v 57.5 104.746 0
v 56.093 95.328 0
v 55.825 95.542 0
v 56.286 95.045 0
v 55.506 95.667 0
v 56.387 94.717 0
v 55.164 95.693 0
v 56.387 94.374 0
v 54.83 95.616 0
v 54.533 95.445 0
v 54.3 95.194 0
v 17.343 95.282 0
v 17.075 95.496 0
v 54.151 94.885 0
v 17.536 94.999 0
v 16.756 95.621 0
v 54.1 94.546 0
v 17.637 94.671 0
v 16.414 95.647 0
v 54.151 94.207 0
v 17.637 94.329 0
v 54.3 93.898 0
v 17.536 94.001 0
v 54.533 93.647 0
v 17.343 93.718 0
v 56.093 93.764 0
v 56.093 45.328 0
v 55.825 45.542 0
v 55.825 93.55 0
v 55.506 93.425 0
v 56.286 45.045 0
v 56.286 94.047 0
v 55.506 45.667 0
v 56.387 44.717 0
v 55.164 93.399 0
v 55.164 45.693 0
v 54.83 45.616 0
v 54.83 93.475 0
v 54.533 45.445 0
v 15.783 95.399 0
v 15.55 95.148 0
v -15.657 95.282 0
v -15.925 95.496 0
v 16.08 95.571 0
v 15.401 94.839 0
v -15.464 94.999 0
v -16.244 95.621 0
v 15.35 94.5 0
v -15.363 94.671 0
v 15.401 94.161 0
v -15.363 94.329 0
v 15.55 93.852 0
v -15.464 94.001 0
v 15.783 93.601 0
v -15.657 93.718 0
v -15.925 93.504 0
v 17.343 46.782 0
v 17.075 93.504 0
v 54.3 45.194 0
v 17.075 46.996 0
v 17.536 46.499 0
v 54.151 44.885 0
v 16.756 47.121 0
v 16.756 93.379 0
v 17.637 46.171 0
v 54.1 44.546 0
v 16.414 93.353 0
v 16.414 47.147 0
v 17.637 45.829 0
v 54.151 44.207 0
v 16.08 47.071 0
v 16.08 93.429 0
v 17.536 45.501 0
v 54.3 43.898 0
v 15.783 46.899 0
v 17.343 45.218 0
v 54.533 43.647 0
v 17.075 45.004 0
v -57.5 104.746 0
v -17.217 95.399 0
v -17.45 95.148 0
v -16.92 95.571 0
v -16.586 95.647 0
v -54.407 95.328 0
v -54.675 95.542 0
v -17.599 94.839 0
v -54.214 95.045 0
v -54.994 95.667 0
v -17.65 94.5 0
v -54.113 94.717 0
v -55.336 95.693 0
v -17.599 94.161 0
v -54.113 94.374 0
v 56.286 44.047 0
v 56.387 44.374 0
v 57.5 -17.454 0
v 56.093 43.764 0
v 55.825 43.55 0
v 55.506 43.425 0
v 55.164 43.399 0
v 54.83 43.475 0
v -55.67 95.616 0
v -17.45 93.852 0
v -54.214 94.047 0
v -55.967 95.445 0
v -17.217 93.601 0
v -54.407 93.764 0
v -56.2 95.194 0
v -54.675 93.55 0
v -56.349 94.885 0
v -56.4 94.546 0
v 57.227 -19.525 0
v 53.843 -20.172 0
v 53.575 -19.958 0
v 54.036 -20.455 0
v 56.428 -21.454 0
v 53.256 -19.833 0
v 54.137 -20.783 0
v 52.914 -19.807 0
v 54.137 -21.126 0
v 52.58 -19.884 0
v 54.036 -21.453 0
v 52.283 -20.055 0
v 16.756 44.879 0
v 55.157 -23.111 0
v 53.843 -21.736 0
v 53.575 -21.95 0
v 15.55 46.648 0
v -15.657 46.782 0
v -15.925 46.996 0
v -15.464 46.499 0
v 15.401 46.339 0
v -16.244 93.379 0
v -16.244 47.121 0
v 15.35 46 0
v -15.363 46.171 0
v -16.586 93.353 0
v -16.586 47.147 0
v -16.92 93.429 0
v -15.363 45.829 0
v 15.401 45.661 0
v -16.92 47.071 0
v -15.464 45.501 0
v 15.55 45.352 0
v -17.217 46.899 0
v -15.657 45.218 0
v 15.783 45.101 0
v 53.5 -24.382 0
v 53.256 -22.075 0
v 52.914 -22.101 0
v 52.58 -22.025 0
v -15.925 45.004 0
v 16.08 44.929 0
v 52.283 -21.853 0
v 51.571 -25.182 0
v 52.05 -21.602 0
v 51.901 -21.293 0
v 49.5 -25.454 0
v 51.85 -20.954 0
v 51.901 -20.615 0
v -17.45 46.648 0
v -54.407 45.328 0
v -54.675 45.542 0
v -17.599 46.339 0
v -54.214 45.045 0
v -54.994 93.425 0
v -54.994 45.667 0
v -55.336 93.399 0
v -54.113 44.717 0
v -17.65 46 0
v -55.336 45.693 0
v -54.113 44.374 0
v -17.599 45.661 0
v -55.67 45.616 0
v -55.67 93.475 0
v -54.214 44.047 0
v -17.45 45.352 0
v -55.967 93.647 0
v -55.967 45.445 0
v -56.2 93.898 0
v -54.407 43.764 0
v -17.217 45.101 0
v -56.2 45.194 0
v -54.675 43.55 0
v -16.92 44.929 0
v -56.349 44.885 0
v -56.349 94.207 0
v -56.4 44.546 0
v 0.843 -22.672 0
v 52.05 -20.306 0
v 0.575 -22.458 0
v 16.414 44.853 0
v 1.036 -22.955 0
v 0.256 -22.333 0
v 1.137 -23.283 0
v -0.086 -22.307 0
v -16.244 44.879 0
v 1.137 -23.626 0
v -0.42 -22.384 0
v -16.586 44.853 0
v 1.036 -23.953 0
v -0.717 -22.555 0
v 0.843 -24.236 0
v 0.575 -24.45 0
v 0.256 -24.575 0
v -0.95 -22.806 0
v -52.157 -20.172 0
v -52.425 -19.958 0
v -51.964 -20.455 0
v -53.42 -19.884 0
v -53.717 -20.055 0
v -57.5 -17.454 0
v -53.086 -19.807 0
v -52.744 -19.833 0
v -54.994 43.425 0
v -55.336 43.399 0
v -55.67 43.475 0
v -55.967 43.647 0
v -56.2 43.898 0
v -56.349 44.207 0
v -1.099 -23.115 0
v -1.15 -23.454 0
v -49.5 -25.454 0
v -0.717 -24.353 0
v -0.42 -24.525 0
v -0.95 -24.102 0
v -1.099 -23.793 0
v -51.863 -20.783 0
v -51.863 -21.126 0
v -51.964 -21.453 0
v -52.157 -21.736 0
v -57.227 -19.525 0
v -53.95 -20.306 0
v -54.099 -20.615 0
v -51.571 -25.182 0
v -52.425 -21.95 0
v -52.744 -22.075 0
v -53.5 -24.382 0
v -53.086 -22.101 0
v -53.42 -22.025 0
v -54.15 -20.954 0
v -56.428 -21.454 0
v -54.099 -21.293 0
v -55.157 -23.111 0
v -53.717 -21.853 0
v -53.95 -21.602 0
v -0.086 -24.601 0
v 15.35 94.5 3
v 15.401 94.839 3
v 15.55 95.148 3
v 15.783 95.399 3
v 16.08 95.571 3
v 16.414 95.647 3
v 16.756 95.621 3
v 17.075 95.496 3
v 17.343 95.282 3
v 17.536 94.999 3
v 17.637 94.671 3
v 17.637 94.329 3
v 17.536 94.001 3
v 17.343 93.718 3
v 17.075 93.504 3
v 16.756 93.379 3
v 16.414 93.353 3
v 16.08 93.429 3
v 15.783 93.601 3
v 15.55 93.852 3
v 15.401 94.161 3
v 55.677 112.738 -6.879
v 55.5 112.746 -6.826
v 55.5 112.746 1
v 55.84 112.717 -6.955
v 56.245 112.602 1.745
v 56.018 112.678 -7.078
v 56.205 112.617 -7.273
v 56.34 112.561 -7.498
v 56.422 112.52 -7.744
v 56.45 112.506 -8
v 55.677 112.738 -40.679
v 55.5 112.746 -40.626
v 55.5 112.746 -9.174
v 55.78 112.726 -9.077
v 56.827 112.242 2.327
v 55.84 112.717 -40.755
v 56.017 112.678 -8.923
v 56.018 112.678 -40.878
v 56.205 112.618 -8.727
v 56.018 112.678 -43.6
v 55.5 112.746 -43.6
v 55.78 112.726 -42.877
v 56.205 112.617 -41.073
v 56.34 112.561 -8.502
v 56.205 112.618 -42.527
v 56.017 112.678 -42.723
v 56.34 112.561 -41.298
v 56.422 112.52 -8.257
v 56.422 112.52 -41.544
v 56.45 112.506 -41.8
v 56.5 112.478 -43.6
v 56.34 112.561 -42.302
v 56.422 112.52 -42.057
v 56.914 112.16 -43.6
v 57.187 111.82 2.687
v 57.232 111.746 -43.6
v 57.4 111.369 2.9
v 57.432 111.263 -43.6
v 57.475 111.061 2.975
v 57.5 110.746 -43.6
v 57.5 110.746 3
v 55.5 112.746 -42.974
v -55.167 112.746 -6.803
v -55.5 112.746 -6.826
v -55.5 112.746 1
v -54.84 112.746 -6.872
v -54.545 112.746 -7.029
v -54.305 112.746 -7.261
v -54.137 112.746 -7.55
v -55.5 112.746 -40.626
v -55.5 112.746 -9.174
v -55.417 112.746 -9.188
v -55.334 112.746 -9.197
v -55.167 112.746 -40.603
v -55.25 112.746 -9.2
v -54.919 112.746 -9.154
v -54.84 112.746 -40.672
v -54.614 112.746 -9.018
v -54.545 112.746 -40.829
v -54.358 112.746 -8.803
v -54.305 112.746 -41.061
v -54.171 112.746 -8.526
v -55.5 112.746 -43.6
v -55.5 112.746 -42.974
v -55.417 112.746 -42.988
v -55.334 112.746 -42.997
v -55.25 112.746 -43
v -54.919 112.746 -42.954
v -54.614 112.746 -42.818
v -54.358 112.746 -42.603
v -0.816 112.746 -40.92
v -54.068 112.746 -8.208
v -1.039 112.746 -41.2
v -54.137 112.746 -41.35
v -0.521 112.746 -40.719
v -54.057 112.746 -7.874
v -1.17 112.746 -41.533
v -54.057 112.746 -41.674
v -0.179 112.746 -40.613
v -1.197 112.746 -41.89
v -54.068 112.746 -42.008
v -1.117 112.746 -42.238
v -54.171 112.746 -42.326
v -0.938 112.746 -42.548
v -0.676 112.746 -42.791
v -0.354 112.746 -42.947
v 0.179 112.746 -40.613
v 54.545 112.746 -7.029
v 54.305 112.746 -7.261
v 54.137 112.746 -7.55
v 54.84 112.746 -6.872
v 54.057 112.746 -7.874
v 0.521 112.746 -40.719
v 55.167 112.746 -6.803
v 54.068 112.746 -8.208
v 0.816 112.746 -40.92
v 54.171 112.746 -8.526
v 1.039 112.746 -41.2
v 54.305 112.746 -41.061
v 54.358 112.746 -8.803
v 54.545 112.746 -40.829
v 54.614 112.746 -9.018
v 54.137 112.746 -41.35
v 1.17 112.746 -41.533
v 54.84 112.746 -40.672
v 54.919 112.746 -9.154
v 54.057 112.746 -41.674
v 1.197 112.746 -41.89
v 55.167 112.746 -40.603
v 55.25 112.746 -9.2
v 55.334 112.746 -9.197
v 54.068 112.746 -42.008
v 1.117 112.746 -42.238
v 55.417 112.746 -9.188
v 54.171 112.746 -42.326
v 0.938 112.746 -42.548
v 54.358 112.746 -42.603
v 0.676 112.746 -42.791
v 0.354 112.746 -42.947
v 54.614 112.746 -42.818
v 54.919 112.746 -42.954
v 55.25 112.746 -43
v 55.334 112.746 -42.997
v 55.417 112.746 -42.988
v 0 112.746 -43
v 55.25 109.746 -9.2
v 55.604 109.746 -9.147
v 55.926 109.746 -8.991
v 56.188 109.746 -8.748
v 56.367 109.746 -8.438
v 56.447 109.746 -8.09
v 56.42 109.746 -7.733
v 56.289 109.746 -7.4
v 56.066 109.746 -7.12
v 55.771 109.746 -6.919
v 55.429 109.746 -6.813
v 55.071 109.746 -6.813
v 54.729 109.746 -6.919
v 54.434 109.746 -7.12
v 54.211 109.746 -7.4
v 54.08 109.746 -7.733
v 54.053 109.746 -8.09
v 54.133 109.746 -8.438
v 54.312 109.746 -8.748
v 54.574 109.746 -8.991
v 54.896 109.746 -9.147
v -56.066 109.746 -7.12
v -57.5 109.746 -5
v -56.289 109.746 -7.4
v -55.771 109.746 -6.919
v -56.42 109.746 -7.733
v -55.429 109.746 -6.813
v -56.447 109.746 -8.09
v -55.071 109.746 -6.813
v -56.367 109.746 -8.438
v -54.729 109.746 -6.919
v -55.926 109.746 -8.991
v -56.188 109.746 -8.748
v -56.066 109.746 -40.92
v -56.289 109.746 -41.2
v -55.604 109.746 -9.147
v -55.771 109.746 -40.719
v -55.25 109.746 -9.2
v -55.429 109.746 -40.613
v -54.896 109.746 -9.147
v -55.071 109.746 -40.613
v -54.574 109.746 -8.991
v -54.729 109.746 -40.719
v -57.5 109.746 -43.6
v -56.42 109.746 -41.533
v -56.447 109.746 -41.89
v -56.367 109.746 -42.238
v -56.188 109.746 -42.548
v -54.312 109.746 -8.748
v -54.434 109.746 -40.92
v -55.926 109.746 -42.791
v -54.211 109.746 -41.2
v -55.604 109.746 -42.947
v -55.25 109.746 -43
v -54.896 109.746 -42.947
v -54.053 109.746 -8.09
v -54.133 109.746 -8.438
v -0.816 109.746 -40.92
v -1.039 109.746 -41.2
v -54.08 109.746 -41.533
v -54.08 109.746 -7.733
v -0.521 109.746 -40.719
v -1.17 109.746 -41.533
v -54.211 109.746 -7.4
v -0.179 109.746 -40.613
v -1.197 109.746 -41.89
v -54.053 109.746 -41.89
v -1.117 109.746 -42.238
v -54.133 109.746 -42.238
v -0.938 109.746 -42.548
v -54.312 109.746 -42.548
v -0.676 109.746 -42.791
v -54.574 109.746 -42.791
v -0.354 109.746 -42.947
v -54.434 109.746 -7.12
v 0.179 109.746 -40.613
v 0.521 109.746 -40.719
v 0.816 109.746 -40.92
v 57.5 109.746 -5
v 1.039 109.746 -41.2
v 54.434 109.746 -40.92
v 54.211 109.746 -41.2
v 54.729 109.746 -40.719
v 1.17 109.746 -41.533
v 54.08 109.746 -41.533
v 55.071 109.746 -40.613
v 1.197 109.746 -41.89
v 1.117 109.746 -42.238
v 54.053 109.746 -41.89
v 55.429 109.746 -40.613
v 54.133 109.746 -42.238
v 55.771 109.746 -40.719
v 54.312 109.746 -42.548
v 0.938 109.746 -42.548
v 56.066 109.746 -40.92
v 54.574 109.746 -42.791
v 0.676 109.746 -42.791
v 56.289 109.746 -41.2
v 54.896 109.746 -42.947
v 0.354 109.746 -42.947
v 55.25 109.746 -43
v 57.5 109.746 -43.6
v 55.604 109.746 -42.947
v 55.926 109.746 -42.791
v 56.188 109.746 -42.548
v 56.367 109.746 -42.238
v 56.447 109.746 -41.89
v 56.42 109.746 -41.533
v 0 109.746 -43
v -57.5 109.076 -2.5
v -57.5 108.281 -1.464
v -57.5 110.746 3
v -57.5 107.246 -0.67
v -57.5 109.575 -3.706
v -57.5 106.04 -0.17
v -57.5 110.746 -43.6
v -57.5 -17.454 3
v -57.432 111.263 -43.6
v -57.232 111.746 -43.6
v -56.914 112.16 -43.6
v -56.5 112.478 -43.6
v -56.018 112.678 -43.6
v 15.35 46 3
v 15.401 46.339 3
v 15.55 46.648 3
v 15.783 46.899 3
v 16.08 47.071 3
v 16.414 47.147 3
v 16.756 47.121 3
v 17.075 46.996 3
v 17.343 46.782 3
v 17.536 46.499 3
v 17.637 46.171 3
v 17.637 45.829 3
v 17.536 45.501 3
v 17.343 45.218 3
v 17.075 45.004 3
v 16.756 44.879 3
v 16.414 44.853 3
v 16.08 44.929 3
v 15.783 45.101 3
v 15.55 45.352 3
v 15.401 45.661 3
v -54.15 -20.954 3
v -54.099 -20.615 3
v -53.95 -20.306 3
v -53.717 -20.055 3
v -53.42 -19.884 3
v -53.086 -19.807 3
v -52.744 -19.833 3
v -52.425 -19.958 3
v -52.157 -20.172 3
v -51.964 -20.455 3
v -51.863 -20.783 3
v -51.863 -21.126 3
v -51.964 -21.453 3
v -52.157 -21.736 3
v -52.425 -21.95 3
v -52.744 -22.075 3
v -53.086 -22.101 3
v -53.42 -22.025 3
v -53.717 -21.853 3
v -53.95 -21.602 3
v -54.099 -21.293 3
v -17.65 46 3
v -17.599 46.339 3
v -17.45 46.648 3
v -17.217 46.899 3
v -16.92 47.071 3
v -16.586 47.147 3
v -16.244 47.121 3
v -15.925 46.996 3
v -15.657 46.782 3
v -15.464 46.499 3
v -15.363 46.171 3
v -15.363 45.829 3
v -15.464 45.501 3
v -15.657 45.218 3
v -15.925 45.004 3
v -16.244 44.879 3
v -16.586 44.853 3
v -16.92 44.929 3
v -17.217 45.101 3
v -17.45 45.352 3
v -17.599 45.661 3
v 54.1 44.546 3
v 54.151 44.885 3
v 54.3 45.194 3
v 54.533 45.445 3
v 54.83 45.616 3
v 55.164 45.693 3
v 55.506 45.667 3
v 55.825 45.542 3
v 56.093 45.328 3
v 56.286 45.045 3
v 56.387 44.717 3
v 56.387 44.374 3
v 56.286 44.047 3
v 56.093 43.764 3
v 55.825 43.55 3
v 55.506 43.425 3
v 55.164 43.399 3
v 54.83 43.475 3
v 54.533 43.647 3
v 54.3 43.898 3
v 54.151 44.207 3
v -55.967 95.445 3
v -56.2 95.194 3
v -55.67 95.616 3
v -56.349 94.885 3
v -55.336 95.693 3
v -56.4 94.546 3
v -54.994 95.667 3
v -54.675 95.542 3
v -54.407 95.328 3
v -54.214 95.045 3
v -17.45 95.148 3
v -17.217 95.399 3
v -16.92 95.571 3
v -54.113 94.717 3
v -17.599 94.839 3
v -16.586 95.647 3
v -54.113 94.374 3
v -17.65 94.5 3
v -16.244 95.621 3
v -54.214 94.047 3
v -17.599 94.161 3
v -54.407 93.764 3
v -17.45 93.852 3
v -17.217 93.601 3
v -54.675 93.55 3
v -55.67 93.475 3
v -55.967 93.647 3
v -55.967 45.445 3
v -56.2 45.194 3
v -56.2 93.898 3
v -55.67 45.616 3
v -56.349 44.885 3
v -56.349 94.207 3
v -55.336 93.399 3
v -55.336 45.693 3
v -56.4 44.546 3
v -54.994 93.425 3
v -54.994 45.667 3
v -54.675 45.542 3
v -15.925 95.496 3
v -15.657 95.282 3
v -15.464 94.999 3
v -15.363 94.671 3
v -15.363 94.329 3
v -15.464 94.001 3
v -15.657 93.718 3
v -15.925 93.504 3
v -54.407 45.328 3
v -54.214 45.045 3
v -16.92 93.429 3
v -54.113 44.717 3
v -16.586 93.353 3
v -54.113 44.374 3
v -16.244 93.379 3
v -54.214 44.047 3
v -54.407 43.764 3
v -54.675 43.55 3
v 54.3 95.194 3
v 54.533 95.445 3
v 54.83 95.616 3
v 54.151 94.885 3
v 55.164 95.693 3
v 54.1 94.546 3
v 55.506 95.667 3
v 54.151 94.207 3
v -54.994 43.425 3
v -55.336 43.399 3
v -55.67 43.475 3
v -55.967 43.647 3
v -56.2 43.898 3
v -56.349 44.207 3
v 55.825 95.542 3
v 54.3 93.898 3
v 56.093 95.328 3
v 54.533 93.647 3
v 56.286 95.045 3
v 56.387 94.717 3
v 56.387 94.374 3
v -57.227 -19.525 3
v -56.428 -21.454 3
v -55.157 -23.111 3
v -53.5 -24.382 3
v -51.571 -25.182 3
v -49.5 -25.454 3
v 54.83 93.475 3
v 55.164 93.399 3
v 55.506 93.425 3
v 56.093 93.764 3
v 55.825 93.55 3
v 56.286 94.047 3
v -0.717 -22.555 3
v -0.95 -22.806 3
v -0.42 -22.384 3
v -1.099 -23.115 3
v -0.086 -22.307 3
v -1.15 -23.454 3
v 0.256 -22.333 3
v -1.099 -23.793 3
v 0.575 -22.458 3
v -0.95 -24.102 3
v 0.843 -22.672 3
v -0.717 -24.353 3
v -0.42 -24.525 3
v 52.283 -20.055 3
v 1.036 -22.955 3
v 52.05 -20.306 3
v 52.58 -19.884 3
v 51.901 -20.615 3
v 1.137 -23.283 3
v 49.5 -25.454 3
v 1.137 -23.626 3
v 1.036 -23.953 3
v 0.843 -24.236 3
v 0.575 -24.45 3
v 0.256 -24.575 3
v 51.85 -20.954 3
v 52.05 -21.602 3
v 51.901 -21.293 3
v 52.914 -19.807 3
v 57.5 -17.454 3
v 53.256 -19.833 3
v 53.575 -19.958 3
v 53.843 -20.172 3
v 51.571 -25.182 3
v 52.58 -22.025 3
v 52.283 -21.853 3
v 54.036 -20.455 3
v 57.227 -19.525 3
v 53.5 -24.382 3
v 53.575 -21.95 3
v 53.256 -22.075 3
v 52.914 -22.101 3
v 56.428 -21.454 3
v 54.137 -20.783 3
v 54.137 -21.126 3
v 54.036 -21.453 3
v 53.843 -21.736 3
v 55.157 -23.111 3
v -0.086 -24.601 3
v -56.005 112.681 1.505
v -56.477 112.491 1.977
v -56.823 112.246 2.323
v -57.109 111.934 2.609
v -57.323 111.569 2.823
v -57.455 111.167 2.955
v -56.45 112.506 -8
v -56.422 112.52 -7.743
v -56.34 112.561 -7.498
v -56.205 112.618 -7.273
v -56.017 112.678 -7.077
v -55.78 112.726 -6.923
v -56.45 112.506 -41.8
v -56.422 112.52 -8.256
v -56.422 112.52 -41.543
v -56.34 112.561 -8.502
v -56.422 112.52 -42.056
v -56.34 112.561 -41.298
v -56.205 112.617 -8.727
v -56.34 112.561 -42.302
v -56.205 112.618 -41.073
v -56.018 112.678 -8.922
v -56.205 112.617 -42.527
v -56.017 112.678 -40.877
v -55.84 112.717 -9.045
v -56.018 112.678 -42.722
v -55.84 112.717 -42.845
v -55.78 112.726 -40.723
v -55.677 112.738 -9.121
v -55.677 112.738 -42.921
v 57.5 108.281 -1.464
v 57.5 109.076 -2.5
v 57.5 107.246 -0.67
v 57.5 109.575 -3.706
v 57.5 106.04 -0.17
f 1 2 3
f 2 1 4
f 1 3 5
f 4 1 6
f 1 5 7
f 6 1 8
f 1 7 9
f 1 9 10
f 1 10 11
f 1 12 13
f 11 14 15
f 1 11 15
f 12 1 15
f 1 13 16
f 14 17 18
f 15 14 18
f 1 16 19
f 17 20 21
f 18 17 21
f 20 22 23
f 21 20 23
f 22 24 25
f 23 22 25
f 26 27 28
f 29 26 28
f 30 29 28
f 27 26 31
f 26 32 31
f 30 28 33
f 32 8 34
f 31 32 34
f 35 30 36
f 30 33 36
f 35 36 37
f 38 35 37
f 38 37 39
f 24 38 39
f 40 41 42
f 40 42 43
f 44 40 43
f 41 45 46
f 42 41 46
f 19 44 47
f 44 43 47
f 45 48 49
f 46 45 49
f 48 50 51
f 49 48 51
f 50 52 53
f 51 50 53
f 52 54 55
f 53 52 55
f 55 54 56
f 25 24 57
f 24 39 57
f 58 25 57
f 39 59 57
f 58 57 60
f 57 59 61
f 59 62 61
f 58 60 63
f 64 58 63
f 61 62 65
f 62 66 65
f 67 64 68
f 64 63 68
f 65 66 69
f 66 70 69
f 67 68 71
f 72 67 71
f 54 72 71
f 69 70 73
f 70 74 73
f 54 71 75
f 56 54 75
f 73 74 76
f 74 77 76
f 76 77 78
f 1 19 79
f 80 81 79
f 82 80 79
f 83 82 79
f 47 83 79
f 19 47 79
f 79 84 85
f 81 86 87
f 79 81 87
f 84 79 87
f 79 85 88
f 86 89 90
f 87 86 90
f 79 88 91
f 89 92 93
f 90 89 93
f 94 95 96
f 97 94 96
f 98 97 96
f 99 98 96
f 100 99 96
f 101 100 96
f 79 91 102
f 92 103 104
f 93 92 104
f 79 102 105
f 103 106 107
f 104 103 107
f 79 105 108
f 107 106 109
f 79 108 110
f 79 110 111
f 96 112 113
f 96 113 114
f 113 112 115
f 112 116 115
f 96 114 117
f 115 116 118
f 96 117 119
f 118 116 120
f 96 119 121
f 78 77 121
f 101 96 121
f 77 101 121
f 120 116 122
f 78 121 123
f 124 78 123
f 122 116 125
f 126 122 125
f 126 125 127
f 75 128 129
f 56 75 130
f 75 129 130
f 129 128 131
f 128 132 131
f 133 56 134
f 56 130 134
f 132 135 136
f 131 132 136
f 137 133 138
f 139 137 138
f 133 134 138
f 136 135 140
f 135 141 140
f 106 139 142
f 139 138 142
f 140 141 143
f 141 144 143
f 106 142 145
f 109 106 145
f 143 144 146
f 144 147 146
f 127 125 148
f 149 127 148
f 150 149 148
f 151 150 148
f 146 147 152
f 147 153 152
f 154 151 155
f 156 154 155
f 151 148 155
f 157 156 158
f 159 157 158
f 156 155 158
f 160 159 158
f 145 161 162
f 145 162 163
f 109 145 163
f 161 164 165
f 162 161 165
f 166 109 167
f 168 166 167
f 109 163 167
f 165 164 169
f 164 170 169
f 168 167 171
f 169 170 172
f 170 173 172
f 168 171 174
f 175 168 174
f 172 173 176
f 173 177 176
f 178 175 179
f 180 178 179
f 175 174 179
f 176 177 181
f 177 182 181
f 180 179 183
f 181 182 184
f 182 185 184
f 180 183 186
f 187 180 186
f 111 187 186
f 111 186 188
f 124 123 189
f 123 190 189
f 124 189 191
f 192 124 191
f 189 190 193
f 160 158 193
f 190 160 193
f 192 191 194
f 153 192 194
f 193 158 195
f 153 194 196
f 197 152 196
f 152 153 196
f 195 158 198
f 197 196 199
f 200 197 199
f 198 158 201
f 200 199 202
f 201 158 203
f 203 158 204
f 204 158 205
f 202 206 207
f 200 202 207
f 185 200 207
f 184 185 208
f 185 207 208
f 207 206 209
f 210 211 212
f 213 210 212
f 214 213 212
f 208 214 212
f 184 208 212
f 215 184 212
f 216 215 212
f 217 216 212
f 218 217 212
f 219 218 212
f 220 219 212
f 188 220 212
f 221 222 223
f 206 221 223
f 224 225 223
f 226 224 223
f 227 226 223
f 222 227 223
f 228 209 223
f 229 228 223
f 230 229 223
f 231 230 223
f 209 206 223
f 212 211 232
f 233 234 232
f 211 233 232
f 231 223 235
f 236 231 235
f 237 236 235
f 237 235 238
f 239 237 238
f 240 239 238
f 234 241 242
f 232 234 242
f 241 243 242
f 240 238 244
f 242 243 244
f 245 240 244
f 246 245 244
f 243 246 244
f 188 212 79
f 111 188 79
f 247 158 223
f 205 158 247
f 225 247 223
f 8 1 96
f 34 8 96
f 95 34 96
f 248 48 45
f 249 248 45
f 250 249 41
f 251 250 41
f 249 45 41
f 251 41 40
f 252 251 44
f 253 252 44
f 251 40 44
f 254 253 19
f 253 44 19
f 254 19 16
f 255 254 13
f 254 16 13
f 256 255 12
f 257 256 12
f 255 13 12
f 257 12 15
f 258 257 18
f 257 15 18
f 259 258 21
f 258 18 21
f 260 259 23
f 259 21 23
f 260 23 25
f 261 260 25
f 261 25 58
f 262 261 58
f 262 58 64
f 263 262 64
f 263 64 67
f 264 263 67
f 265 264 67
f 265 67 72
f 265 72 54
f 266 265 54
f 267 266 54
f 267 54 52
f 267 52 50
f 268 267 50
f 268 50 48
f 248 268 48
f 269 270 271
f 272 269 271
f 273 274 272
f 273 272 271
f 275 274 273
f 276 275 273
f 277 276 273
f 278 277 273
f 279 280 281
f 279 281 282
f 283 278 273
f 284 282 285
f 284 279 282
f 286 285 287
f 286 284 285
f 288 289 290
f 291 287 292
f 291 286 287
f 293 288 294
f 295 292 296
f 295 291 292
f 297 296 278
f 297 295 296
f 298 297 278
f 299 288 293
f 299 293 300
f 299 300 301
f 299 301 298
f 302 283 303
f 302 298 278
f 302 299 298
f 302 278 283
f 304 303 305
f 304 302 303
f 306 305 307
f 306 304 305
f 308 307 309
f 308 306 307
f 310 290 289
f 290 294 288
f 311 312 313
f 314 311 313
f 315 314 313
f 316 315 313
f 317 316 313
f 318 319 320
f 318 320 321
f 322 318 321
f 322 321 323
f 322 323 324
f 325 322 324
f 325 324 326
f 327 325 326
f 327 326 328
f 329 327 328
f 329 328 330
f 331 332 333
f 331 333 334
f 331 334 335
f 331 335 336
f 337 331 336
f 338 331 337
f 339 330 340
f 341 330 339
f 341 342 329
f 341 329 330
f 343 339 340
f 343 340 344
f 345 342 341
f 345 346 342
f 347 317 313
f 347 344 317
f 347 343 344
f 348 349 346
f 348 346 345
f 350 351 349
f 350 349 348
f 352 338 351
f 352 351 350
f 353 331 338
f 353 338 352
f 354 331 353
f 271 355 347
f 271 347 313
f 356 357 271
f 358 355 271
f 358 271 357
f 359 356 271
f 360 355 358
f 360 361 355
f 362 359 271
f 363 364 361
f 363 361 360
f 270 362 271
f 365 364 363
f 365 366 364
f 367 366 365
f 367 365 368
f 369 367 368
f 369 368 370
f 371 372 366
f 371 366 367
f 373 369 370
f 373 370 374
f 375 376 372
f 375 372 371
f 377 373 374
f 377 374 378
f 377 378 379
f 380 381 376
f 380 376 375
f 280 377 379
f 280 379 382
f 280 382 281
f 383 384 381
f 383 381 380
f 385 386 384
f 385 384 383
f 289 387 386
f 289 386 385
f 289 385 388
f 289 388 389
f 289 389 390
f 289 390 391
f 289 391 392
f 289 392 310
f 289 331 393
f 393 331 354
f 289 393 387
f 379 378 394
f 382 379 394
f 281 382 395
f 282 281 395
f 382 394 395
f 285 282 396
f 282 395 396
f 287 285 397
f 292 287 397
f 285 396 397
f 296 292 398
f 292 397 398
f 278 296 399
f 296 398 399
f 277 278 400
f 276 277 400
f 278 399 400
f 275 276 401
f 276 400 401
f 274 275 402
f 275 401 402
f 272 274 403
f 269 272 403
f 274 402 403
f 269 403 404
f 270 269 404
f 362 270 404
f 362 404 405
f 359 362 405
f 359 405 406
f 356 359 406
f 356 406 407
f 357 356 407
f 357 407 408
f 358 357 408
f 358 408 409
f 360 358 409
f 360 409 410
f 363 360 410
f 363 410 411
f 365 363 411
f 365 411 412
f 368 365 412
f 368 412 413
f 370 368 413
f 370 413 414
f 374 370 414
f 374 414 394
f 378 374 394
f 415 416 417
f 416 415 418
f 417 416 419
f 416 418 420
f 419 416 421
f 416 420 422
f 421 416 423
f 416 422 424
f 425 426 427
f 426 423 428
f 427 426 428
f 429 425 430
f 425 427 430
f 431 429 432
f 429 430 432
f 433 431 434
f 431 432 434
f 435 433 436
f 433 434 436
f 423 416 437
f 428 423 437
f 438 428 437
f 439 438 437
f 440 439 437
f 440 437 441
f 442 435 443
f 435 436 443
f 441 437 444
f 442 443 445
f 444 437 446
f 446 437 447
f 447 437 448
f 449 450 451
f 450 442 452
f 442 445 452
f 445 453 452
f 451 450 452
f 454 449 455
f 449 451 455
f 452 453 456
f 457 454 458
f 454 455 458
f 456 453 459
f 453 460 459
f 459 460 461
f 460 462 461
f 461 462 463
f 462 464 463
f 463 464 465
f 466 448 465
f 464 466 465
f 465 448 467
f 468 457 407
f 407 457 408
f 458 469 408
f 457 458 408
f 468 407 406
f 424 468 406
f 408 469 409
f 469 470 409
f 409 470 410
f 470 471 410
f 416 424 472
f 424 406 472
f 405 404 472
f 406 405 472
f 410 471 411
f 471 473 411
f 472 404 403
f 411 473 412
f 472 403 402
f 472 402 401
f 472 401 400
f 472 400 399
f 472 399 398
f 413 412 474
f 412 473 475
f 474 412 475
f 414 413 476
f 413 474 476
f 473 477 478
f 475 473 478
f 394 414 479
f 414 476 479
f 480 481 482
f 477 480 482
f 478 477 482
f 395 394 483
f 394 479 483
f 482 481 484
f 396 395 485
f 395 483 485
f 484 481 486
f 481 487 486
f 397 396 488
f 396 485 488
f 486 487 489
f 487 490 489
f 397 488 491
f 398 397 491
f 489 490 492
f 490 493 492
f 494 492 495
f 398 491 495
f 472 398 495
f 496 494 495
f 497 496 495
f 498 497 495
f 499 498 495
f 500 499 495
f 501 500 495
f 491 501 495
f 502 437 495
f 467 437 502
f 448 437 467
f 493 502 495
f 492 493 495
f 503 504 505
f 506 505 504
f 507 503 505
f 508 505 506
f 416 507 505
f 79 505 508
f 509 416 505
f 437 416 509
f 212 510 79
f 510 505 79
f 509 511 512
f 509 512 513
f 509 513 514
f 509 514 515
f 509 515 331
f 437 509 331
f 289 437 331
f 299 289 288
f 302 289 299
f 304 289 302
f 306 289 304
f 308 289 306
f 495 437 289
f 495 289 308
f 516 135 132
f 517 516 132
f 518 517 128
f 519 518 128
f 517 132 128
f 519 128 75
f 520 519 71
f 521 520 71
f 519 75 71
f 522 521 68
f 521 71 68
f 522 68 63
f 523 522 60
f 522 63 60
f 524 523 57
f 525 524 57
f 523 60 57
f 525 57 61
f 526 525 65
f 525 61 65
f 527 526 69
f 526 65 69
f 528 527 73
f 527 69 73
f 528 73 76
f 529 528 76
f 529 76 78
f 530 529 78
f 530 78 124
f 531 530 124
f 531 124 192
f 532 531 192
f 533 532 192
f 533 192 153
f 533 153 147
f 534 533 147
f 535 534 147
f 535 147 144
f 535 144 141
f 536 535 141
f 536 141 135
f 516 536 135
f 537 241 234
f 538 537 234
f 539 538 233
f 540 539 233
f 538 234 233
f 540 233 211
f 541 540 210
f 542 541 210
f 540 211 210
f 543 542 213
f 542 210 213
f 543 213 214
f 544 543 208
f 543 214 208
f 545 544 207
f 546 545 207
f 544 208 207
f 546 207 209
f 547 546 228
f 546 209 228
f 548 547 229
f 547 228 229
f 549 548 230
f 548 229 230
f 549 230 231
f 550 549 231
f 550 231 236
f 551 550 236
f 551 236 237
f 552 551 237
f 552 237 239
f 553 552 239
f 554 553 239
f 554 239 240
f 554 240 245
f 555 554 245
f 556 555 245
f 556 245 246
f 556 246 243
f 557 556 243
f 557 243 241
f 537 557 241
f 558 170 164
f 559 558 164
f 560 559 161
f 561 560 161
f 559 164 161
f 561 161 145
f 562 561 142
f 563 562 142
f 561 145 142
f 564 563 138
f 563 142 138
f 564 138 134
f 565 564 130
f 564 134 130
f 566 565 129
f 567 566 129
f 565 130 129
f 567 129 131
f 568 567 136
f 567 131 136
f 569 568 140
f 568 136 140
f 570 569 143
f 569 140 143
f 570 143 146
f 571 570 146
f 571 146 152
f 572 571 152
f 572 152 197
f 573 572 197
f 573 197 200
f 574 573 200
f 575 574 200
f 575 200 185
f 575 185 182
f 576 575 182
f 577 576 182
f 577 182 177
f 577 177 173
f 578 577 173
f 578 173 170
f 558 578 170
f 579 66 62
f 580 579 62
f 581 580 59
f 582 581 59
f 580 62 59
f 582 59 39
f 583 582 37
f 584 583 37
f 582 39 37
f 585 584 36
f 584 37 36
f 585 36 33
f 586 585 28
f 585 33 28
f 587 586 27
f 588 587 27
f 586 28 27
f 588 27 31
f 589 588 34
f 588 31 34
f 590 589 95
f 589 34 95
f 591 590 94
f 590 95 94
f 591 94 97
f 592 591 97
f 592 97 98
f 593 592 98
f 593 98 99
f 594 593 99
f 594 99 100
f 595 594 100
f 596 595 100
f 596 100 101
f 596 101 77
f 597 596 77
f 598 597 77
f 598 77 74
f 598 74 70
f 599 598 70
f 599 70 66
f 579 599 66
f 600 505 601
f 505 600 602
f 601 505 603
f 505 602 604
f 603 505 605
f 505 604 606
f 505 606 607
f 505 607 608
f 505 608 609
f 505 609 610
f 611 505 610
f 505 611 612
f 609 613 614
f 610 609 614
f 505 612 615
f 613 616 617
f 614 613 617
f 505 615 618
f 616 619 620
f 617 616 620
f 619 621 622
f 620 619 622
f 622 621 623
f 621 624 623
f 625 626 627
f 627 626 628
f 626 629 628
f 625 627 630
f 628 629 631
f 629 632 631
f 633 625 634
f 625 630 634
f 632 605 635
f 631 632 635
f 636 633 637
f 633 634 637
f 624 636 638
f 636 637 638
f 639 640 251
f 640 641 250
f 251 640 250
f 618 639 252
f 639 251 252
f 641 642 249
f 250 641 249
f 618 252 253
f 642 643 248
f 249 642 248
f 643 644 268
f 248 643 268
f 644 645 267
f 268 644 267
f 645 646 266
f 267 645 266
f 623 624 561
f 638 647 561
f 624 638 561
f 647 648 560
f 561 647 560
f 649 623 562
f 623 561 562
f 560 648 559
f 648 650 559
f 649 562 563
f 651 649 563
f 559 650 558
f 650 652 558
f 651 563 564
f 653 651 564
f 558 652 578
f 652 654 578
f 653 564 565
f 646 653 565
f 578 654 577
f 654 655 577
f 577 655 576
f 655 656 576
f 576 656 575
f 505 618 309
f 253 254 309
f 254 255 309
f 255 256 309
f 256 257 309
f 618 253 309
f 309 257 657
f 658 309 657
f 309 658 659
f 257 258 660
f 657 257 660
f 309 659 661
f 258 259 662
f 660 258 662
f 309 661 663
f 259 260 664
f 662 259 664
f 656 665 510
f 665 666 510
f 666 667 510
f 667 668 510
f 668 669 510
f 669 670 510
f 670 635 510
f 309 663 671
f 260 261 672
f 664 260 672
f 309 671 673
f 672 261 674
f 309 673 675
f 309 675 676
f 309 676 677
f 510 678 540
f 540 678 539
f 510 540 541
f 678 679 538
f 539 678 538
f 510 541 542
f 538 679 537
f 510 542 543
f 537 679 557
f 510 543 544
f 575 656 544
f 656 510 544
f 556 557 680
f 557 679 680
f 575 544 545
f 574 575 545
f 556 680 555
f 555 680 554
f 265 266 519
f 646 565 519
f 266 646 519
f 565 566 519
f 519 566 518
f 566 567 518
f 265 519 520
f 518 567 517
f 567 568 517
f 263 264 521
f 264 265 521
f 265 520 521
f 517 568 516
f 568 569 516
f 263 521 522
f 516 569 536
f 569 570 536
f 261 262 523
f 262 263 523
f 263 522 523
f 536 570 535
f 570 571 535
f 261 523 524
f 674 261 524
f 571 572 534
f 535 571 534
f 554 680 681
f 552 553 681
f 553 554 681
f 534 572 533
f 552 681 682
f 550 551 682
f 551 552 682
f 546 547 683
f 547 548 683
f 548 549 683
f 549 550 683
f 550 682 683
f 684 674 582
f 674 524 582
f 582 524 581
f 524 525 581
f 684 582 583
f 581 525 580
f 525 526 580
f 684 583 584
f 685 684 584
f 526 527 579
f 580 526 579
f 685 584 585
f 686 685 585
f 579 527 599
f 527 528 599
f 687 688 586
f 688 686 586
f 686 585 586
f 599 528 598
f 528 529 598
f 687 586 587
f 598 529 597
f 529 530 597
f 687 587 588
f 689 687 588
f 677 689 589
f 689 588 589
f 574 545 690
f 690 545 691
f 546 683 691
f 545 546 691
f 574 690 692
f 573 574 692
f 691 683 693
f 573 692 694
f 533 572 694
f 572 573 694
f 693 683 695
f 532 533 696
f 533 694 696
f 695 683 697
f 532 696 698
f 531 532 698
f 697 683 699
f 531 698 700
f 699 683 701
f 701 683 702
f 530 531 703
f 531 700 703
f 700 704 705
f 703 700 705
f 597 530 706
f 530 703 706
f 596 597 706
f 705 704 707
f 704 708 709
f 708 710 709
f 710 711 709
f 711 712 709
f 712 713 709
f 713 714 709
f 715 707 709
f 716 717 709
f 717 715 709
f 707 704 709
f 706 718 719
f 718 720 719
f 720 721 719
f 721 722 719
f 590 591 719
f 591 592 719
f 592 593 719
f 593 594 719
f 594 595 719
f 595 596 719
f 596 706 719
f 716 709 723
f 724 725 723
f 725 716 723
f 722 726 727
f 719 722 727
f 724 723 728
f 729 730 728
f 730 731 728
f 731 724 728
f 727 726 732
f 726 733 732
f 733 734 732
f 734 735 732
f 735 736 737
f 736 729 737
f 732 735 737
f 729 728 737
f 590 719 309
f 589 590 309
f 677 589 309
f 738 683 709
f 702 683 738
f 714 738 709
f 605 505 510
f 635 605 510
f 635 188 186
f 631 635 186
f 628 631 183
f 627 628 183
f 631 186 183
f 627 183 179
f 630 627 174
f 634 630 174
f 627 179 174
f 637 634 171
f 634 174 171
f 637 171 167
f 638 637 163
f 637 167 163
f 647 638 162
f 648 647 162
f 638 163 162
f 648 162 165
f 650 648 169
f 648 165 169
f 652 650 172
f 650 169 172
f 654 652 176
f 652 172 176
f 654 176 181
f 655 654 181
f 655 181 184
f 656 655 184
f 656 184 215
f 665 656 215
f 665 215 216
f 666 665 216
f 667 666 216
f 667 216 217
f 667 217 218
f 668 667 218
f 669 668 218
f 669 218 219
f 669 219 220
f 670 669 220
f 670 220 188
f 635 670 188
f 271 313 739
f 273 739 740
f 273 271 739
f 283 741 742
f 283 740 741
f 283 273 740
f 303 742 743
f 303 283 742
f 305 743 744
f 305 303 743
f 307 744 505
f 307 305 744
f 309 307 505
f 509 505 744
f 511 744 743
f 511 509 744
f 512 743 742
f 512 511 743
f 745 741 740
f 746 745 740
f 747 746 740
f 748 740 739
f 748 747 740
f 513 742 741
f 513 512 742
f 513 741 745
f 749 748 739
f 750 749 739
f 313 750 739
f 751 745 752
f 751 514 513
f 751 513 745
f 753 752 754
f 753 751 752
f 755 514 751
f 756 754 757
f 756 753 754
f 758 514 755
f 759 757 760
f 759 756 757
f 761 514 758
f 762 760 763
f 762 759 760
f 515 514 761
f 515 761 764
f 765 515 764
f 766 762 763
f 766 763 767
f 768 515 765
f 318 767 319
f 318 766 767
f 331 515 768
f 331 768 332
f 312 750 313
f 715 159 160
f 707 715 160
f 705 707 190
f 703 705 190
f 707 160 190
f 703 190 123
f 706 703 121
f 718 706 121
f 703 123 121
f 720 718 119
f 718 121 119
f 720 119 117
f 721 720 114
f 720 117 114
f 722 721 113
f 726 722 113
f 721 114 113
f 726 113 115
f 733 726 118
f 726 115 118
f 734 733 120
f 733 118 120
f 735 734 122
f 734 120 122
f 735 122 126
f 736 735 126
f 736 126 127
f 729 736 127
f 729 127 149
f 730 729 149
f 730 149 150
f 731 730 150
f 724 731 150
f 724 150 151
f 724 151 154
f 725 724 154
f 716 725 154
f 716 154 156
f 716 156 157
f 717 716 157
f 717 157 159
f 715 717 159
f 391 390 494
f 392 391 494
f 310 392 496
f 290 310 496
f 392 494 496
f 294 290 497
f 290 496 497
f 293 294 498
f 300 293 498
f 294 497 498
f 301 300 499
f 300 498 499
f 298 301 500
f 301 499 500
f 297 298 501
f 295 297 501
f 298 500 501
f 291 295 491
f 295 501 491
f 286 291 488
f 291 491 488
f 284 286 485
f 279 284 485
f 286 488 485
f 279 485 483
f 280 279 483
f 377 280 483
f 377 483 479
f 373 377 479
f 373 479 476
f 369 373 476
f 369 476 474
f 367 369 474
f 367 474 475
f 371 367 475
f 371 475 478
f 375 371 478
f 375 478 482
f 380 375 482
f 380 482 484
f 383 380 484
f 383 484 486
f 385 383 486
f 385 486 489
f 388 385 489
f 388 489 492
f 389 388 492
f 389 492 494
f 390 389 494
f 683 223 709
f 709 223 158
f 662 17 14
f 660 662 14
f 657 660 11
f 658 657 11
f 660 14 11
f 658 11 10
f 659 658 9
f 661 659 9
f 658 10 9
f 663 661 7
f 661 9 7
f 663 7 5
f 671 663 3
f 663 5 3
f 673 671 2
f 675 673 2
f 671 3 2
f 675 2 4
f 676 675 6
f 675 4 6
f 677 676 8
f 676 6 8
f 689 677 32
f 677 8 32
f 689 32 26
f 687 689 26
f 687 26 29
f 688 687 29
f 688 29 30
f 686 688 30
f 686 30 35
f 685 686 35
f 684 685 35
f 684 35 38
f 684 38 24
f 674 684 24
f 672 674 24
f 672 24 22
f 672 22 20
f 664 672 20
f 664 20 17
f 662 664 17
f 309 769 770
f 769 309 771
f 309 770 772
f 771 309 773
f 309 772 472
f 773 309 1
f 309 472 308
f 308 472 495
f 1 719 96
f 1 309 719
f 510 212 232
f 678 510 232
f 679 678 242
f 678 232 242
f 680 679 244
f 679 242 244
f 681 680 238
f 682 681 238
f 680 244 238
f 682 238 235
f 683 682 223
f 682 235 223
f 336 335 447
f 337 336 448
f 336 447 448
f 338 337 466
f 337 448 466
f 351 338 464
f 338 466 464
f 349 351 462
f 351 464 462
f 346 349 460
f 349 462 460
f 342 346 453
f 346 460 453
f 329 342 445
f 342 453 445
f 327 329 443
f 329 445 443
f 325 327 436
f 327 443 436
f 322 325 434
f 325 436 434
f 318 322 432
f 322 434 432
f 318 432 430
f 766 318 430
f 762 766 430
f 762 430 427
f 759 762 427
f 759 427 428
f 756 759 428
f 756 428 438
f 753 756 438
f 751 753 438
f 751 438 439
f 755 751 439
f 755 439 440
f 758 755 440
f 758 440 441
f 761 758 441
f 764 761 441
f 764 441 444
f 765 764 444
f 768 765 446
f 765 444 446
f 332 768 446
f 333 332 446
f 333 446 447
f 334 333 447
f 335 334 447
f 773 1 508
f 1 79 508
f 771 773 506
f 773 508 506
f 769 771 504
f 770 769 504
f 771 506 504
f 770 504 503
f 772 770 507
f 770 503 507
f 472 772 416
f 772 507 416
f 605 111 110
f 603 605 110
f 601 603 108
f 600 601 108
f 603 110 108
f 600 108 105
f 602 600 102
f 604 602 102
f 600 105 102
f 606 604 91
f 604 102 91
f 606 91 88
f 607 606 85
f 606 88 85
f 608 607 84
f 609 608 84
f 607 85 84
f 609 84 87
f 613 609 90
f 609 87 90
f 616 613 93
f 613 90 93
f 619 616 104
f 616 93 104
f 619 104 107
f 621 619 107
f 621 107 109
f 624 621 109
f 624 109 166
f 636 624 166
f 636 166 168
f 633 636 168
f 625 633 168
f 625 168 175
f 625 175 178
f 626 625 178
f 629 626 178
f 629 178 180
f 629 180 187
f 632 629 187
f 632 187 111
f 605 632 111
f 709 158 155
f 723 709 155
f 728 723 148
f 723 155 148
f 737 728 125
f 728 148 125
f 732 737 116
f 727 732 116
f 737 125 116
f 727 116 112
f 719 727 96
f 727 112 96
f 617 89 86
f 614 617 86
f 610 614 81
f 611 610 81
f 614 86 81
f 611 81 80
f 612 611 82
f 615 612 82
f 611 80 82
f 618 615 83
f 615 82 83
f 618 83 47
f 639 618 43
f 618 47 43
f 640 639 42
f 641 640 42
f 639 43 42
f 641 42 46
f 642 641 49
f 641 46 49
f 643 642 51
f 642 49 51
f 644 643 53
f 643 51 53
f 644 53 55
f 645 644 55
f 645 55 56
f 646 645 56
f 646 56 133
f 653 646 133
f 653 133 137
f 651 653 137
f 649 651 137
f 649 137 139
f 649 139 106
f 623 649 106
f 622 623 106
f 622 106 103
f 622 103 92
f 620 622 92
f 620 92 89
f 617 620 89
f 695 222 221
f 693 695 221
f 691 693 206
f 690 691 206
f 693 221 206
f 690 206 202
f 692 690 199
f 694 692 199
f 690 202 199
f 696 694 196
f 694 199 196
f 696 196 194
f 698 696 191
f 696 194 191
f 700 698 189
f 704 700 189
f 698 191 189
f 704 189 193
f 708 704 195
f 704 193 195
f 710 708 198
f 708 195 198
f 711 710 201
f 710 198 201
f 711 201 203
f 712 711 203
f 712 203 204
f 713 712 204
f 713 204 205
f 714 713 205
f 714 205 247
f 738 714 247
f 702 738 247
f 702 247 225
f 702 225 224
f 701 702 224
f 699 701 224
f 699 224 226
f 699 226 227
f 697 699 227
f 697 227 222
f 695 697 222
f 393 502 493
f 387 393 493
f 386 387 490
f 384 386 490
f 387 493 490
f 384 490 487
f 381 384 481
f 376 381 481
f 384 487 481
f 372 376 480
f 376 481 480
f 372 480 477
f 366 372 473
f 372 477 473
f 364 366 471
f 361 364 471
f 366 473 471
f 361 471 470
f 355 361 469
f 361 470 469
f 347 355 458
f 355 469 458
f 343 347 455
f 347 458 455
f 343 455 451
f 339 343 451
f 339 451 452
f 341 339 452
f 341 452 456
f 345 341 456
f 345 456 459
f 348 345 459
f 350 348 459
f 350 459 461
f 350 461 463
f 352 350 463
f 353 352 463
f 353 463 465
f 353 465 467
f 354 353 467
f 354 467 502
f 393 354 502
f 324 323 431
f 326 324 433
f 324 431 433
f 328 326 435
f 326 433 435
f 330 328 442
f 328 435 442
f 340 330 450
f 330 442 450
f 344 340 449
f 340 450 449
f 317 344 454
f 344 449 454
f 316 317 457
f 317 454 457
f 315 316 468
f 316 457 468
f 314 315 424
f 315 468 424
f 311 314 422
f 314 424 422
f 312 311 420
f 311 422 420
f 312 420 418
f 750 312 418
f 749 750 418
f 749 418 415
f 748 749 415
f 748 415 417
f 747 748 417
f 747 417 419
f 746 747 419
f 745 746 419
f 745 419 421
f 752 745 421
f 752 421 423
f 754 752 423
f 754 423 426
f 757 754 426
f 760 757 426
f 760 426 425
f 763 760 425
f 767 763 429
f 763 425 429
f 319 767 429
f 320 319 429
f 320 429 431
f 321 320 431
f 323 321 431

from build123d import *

# Parameters (mm, degrees)
BOSS_EXTRUDE3_DEPTH = 3
MOVE_FACE1_BY       = 5.4
SKETCH3_W           = 115
SKETCH3_H           = 46.6
BOSS_EXTRUDE4_DEPTH = 3
FILLET3_R           = 5
FILLET5_R           = 2
SKETCH4_R           = 1.15
CUT_EXTRUDE1_DEPTH  = 134.861204865
SKETCH5_R           = 1.2
CUT_EXTRUDE2_DEPTH  = 154.25224305
SKETCH6_R           = 1.15
CUT_EXTRUDE6_DEPTH  = 134.861205025


with BuildPart() as part:
    # Sketch1 → Boss-Extrude3 (new body)
    with BuildSketch(Plane.XY):
        with BuildLine():
            Line((-49.5, -25.454214411), (49.5, -25.454214411))
            ThreePointArc((49.5, -25.454214411), (55.156854249, -23.111068661), (57.5, -17.454214411))
            Line((57.5, -17.454214411), (57.5, 104.345785589))
            Line((57.5, 104.345785589), (-57.5, 104.345785589))
            Line((-57.5, 104.345785589), (-57.5, -17.454214411))
            ThreePointArc((-57.5, -17.454214411), (-55.156854249, -23.111068661), (-49.5, -25.454214411))
        make_face()
    extrude(amount=BOSS_EXTRUDE3_DEPTH)

    # Move Face1: a face moved outward by 5.4
    extrude(part.faces().sort_by_distance((0, 104.345785589, 1.5))[0], amount=MOVE_FACE1_BY, dir=(0, 1, 0))

    # Sketch3 → Boss-Extrude4 (add)
    with BuildSketch(Plane(origin=(0, 109.745785589, 0), x_dir=(1, 0, 0), z_dir=(0, 1, 0))):
        with Locations((0, 20.3)):
            Rectangle(SKETCH3_W, SKETCH3_H)
    extrude(amount=BOSS_EXTRUDE4_DEPTH)

    # Fillet3
    fillet3_edges = [part.edges().sort_by_distance(p)[0] for p in [
        (0, 109.745785589, 0),
    ]]
    fillet(fillet3_edges, radius=FILLET3_R)

    # Fillet5
    fillet5_edges = [part.edges().sort_by_distance(p)[0] for p in [
        (-57.5, 112.745785589, -20.3),
        (0, 112.745785589, 3),
        (57.5, 112.745785589, -20.3),
    ]]
    fillet(fillet5_edges, radius=FILLET5_R)

    # Sketch4 → Cut-Extrude1 (cut, through all)
    with BuildSketch(Plane(origin=(0, 0, 0), x_dir=(-1, 0, 0), z_dir=(0, 0, -1))):
        with Locations((-53, -20.954214411)):
            Circle(SKETCH4_R)
        with Locations((-55.25, 44.545785589)):
            Circle(SKETCH4_R)
        with Locations((-55.25, 94.545785589)):
            Circle(SKETCH4_R)
        with Locations((0, -23.454214411)):
            Circle(SKETCH4_R)
        with Locations((53, -20.954214411)):
            Circle(SKETCH4_R)
        with Locations((55.25, 44.545785589)):
            Circle(SKETCH4_R)
        with Locations((55.25, 94.545785589)):
            Circle(SKETCH4_R)
    extrude(amount=-CUT_EXTRUDE1_DEPTH, mode=Mode.SUBTRACT)

    # Sketch5 → Cut-Extrude2 (cut, through all)
    with BuildSketch(Plane.XZ.offset(-109.745785589)):
        with Locations(Location((55.25, -8, 0), (0, 0, 270))):
            Circle(SKETCH5_R)
        with Locations(Location((55.25, -41.8, 0), (0, 0, 270))):
            Circle(SKETCH5_R)
        with Locations(Location((0, -41.8, 0), (0, 0, 270))):
            Circle(SKETCH5_R)
        with Locations(Location((-55.25, -8, 0), (0, 0, 270))):
            Circle(SKETCH5_R)
        with Locations(Location((-55.25, -41.8, 0), (0, 0, 270))):
            Circle(SKETCH5_R)
    extrude(amount=-CUT_EXTRUDE2_DEPTH, mode=Mode.SUBTRACT)

    # Sketch6 → Cut-Extrude6 (cut, through all)
    with BuildSketch(Plane(origin=(0, 0, 0), x_dir=(-1, 0, 0), z_dir=(0, 0, -1))):
        with Locations((-16.5, 46)):
            Circle(SKETCH6_R)
        with Locations((16.5, 46)):
            Circle(SKETCH6_R)
        with Locations((16.5, 94.5)):
            Circle(SKETCH6_R)
        with Locations((-16.5, 94.5)):
            Circle(SKETCH6_R)
    extrude(amount=-CUT_EXTRUDE6_DEPTH, mode=Mode.SUBTRACT)


solid = part.part
